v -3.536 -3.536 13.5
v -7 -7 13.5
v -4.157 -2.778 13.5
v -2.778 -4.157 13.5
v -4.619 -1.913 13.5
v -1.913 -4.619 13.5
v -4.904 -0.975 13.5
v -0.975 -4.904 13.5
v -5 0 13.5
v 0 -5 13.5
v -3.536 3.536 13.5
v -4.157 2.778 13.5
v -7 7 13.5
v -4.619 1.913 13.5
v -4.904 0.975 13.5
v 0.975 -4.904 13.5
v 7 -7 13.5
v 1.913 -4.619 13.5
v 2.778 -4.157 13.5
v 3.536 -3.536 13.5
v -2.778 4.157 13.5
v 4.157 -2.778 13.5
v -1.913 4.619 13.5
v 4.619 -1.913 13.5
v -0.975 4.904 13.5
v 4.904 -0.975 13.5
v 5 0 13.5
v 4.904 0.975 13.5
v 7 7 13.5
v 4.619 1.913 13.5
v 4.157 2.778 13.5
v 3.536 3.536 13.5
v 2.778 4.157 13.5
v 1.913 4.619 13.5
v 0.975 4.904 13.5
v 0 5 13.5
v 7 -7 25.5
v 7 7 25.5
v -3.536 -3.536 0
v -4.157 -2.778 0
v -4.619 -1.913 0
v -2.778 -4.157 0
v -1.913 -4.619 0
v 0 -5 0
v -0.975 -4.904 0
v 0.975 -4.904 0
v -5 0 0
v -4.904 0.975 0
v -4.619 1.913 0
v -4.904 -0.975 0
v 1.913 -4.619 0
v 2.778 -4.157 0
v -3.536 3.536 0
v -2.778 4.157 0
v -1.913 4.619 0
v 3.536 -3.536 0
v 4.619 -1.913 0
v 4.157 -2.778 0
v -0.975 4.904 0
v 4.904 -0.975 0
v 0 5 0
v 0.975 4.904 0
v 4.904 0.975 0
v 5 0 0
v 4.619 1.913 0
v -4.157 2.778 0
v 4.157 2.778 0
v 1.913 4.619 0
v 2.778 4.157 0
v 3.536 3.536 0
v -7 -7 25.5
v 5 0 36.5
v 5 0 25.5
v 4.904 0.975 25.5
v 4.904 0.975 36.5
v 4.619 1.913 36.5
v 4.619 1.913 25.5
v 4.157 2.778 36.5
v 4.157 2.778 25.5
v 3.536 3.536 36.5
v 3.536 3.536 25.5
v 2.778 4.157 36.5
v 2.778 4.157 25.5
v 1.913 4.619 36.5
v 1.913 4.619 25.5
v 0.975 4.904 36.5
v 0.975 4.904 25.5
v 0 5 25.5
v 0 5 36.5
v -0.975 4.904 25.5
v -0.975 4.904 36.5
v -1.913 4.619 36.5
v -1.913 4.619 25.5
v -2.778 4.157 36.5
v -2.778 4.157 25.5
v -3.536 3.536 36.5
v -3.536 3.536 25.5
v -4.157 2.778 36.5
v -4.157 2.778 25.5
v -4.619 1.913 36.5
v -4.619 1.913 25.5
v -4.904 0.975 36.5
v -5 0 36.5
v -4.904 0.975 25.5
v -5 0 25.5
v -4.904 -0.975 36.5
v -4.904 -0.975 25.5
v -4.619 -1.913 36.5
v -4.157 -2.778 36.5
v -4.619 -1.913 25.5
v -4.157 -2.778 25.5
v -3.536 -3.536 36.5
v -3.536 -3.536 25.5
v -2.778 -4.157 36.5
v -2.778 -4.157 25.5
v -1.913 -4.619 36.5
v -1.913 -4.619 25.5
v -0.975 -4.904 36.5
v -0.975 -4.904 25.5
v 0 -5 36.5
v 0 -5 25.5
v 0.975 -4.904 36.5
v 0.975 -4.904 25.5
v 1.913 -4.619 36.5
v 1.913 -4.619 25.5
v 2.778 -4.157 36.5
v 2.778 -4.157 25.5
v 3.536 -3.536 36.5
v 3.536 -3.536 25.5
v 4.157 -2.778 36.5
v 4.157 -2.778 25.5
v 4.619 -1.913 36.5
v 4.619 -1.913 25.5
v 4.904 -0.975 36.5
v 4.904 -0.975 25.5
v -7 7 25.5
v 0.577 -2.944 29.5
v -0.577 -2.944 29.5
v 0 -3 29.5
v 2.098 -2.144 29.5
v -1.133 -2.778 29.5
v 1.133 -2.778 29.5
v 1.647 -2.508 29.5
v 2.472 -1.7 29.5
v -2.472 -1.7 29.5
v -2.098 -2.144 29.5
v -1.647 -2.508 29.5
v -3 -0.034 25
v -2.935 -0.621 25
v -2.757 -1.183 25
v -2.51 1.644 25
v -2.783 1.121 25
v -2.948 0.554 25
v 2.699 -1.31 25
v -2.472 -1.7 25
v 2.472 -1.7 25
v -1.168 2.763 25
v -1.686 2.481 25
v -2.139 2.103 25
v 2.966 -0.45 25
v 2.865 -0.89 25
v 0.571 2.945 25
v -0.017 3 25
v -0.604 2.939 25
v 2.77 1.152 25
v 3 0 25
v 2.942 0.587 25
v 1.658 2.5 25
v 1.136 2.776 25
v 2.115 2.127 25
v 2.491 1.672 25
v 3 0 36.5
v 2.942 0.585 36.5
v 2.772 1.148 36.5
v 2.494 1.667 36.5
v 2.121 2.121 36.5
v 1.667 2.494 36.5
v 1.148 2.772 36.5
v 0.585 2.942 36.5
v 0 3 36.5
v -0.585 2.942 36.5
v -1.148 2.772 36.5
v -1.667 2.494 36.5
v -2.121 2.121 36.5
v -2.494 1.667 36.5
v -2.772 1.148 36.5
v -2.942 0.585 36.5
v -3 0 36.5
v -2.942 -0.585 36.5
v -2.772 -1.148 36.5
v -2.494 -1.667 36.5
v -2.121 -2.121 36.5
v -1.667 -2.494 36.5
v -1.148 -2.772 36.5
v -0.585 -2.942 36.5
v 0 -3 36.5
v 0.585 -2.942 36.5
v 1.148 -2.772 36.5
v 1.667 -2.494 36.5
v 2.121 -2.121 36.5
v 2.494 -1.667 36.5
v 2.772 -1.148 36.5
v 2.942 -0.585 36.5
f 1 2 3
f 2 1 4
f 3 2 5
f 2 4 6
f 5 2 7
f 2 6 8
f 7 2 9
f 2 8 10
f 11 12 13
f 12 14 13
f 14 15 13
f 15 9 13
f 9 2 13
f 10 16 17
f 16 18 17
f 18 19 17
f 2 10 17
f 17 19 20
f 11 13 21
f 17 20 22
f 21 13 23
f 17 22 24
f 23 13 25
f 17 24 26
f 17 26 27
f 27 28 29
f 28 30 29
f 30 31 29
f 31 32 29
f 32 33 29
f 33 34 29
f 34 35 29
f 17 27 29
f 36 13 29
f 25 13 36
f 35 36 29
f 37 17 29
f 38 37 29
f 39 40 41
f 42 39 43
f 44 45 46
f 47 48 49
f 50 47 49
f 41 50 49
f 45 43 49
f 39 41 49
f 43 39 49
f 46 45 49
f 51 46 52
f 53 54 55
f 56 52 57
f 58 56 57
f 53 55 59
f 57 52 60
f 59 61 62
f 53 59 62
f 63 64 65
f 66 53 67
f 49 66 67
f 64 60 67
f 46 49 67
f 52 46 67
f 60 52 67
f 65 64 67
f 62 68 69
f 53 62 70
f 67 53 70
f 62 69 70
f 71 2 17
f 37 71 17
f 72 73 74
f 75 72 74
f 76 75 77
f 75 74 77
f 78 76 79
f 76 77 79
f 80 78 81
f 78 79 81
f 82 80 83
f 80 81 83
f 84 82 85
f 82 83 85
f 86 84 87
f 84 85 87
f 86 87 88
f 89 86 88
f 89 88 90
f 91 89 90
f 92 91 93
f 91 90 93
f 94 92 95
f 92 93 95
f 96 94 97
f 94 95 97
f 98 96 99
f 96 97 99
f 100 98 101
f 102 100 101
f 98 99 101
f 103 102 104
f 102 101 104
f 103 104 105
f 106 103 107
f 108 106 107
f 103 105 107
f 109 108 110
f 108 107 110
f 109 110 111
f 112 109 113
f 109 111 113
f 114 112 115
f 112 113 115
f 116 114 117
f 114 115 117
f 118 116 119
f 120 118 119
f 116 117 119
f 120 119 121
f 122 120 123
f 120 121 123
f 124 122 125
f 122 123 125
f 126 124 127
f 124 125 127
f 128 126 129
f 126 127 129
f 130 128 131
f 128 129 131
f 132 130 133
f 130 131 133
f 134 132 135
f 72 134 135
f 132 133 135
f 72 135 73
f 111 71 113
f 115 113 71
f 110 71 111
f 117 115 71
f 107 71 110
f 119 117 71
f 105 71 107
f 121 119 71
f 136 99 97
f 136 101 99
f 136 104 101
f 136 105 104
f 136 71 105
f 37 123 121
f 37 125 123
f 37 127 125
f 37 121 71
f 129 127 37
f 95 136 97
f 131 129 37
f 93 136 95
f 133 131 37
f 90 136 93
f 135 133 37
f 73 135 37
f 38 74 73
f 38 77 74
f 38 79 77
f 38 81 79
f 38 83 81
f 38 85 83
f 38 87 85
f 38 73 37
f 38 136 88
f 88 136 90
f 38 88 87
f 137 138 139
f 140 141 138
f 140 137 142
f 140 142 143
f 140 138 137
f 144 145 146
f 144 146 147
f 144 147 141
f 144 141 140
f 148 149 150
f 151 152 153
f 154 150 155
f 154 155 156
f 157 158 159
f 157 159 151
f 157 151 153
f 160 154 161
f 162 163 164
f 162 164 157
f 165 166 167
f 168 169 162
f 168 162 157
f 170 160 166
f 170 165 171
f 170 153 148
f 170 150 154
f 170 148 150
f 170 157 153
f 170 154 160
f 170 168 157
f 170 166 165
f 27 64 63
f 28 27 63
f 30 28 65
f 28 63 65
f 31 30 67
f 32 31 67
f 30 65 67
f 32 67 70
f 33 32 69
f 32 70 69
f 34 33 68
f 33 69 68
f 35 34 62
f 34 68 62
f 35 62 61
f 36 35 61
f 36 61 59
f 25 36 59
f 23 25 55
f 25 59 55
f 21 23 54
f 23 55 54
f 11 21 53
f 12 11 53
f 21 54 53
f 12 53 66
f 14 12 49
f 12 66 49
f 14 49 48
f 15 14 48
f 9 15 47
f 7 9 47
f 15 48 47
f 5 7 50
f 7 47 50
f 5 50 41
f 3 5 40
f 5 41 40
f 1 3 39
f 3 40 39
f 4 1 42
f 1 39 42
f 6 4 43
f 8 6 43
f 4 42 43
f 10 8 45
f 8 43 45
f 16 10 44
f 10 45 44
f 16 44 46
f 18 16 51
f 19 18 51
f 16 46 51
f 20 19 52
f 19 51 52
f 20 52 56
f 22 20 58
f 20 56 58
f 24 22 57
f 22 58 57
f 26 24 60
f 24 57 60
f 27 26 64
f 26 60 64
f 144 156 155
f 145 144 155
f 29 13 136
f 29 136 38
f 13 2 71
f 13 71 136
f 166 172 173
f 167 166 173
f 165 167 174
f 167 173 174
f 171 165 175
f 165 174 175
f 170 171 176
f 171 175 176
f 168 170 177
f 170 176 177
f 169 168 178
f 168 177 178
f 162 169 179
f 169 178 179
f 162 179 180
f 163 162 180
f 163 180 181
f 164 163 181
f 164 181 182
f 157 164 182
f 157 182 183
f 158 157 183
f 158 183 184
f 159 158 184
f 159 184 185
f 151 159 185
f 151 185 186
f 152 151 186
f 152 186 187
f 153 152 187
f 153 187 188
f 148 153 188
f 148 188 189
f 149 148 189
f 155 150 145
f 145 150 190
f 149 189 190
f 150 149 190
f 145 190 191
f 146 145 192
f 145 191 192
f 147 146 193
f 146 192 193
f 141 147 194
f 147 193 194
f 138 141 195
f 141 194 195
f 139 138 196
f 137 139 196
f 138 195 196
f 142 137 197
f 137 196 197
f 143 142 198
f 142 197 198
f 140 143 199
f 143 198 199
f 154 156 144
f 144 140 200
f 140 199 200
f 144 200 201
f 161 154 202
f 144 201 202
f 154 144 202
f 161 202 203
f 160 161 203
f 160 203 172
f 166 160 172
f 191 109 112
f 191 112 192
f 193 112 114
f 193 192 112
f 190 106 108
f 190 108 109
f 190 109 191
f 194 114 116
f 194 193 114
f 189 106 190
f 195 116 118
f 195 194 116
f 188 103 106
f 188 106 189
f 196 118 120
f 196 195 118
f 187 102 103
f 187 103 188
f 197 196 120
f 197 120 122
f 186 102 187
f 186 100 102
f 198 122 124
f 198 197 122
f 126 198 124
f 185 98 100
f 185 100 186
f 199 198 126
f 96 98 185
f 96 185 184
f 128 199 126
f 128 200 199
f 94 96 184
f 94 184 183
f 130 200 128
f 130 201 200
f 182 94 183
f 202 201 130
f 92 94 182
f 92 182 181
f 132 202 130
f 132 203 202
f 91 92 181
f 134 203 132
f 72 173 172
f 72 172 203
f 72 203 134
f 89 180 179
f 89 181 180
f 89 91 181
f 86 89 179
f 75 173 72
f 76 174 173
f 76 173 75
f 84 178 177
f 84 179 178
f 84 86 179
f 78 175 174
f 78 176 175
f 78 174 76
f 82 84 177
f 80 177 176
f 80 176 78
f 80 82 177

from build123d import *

# Parameters (mm, degrees)
F0_R     = 5
F1_DEPTH = 13.5
F2_W     = 14
F2_H     = 14
F3_DEPTH = 12
F4_R     = 5
F5_DEPTH = 11
F6_R     = 3
F7_DEPTH = 11.5
F9_DEPTH = 4.5


with BuildPart() as f1:
    # F0 (on Top) → F1 (new body)
    with BuildSketch(Plane.XY):
        Circle(F0_R)
    extrude(amount=F1_DEPTH)

    # F2 (on face) → F3 (join)
    with BuildSketch(Plane.XY.offset(13.5)):
        Rectangle(F2_W, F2_H)
    extrude(amount=F3_DEPTH)

    # F4 (on face) → F5 (join)
    with BuildSketch(Plane.XY.offset(25.5)):
        Circle(F4_R)
    extrude(amount=F5_DEPTH)

    # F6 (on face) → F7 (cut)
    with BuildSketch(Plane.XY.offset(36.5)):
        Circle(F6_R)
    extrude(amount=-F7_DEPTH, mode=Mode.SUBTRACT)

    # F8 (on face) → F9 (join)
    with BuildSketch(Plane.XY.offset(25)):
        with BuildLine():
            Line((2.4718414189, -1.7), (-2.4718414189, -1.7))
            ThreePointArc((-2.4718414189, -1.7), (0, -3), (2.4718414189, -1.7))
        make_face()
    extrude(amount=F9_DEPTH)


solid = f1.part
